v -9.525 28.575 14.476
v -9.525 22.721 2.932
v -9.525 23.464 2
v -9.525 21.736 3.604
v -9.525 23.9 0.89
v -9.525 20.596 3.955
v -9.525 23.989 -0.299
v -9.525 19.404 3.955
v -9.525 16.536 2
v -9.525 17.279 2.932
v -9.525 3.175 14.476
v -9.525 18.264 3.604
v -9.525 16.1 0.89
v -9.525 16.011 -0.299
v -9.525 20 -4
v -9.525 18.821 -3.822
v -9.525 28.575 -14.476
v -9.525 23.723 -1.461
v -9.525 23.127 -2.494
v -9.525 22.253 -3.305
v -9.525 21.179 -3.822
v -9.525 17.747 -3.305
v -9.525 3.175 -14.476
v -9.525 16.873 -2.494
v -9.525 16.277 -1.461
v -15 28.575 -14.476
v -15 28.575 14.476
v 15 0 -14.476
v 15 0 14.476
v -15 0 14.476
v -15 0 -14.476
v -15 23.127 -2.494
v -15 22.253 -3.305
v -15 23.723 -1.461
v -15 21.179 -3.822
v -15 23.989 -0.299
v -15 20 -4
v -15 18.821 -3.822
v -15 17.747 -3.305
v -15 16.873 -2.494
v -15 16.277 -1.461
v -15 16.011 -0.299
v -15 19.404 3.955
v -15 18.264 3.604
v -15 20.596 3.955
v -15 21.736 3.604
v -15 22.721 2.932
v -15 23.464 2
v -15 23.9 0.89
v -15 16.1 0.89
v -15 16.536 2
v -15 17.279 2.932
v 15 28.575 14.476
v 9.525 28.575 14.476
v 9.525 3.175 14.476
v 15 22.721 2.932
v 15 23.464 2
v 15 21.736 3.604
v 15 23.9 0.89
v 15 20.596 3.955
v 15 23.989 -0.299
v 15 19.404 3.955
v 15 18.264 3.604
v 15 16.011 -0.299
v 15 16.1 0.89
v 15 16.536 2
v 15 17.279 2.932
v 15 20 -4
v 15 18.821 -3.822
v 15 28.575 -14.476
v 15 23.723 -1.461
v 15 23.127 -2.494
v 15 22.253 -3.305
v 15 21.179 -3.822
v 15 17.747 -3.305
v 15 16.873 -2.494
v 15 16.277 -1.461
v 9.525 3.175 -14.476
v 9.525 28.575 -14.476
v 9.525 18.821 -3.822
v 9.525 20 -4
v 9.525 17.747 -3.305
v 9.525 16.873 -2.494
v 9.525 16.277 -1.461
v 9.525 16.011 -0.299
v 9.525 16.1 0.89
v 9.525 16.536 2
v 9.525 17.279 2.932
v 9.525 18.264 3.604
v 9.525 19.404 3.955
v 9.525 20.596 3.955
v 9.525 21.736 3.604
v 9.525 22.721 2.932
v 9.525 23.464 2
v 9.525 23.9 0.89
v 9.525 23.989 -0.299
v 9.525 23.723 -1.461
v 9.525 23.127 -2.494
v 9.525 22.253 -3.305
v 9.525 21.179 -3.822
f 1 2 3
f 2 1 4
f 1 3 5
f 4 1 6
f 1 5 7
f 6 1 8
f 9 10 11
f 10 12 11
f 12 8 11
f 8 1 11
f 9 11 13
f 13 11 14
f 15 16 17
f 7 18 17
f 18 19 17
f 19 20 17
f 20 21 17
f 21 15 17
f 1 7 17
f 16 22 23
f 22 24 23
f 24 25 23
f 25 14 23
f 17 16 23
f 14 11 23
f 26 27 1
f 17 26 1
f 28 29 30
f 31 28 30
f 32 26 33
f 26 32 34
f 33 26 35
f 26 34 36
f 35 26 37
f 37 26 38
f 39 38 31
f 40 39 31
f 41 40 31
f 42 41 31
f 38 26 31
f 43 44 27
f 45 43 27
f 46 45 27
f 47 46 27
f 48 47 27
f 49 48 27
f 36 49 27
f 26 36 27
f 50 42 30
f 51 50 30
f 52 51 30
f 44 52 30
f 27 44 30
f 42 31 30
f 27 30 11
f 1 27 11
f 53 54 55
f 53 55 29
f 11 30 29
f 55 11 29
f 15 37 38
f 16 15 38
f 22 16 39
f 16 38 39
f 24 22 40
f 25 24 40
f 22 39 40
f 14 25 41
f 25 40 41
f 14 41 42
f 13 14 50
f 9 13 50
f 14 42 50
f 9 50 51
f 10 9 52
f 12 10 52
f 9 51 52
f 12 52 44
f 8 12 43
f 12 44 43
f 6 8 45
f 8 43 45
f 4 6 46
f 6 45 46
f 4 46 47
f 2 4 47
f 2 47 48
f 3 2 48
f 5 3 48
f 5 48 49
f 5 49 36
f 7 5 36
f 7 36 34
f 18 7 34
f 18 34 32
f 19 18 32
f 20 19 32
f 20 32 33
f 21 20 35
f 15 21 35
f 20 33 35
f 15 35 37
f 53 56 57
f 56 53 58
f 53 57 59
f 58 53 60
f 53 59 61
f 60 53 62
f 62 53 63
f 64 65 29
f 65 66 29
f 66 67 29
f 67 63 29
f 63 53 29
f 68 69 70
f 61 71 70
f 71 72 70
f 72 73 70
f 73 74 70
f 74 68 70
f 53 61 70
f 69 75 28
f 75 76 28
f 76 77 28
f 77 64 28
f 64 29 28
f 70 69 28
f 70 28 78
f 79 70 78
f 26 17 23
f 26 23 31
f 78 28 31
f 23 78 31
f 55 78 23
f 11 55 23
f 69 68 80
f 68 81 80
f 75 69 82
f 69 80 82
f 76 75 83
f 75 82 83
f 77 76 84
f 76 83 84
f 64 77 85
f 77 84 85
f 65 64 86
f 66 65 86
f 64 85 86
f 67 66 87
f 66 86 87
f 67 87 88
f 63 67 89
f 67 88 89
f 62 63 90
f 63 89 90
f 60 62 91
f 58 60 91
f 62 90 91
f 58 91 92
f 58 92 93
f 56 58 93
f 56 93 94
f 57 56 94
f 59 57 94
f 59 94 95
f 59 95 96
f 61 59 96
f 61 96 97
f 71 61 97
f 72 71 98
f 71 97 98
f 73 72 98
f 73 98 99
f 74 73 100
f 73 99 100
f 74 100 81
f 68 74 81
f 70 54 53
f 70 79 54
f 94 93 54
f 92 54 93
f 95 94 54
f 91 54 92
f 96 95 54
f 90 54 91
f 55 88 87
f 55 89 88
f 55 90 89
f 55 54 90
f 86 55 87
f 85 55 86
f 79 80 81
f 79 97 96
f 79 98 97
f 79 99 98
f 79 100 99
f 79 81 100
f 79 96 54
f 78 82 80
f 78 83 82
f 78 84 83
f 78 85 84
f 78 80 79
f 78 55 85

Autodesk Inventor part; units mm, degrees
ref_plane "XZ Plane" through (0, 0, 0) normal (0, 1, 0) x (-1, 0, 0)
ref_plane "XY Plane" through (0, 0, 0) normal (0, 0, 1) x (1, 0, 0)
sketch "Sketch1" plane through (0, 0, 0) normal (0, 1, 0) x (-1, 0, 0)
  line L0 (-15, -14.4762) -> (15, -14.4762)
  line L1 (15, -14.4762) -> (15, 14.4762)
  line L2 (15, 14.4762) -> (-15, 14.4762)
  line L3 (-15, 14.4762) -> (-15, -14.4762)
  line L4 (-15, -14.4762) -> (15, 14.4762) construction
  line L5 (15, -14.4762) -> (-15, 14.4762) construction
  point P0 (0, 0)
  dimension "d0" = 30
extrude "Extrusion1" add sketch "Sketch1" along normal blind 3.175
sketch "Sketch2" plane through (0, 3.175, 0) normal (0, 1, 0) x (1, 0, 0)
  line L0 (-15, 14.4762) -> (-15, -14.4762) projected
  line L1 (-15, -14.4762) -> (15, -14.4762) projected
  line L2 (15, -14.4762) -> (15, 14.4762) projected
  line L3 (15, 14.4762) -> (-15, 14.4762) projected
  line L4 (-9.525, -14.4762) -> (-9.525, 14.4762)
  line L5 (0, 20.2667) -> (0, -20.2667) projected
  line L6 (9.525, -14.4762) -> (9.525, 14.4762)
  point P0 (0, 0)
  dimension "d3" = 19.05
extrude "Extrusion2" add sketch "Sketch2" along normal blind 25.4 contours L3 L4 L1 L0 | L3 L2 L1 L6
sketch "Sketch3" plane through (15, 0, 14.4762) normal (1, 0, 0) x (0, 0, -1)
  line L0 (-5.7905, 0) -> (34.7429, 0) construction
  line L1 (14.4762, -5.715) -> (14.4762, 34.29) construction
  point P0 (14.4762, 0)
  point P1 (14.4762, 20)
  dimension "d6" = 20
hole "Hole1" at (15, 20, 0) direction (-1, 0, 0) diameter 8 end through all
properties part number "Rough_1in_U_Bracket"
